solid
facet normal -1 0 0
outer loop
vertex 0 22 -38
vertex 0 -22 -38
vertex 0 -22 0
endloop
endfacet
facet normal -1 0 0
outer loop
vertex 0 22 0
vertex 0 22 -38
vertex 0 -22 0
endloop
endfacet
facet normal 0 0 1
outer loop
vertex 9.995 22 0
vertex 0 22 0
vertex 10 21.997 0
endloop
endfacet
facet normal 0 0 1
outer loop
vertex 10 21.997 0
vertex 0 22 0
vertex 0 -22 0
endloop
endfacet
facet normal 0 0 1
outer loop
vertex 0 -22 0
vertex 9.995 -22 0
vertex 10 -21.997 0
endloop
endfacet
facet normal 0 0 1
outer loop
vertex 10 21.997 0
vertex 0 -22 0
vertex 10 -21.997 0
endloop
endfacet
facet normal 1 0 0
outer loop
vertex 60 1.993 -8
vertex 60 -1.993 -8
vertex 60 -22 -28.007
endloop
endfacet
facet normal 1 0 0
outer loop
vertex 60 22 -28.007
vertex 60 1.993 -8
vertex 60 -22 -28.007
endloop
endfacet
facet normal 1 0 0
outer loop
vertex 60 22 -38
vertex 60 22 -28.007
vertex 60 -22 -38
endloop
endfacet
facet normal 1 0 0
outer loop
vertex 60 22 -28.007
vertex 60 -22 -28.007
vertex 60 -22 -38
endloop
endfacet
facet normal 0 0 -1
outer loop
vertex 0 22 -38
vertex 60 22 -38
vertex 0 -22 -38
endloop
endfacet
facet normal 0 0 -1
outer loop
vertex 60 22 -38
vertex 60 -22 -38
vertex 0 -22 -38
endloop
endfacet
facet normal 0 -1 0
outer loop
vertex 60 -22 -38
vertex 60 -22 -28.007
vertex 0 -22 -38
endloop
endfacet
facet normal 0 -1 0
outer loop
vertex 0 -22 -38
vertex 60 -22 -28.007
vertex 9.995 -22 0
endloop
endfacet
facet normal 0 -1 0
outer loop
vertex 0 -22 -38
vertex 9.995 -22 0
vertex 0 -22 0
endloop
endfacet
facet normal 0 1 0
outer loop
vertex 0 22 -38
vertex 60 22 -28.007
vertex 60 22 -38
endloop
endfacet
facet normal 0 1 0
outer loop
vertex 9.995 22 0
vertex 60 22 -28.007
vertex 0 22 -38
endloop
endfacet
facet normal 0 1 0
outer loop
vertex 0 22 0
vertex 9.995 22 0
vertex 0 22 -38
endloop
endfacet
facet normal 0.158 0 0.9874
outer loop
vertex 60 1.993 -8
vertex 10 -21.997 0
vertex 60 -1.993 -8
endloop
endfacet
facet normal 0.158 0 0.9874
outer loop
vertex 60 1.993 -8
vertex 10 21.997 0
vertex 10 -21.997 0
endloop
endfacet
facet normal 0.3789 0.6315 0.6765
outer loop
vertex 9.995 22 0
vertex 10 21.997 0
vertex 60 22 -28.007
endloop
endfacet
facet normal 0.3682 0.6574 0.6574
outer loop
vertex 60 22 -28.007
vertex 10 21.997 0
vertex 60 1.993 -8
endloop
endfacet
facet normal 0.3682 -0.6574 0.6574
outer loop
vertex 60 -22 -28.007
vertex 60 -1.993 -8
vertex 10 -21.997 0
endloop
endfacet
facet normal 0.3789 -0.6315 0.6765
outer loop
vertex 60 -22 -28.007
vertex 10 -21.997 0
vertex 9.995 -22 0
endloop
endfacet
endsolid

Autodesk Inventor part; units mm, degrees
ref_plane "YZ Plane" through (0, 0, 0) normal (1, 0, 0) x (0, 1, 0)
ref_plane "XZ Plane" through (0, 0, 0) normal (0, 1, 0) x (-1, 0, 0)
sketch "草圖1" plane through (0, 0, 0) normal (0, 1, 0) x (-1, 0, 0)
  line L0 (0, 0) -> (-60, 0)
  line L1 (-60, 0) -> (-60, -38)
  line L2 (-60, -38) -> (0, -38)
  line L3 (0, -38) -> (0, 0)
  dimension "d0" = 60
  dimension "d1" = 38
extrude "擠出1" add sketch "草圖1" along normal mid plane 44
sketch "草圖2" plane through (0, 22, 0) normal (0, 1, 0) x (1, 0, 0)
  line L0 (0, 0) -> (60, 0) projected
  line L1 (10, 0) -> (60, 8)
  line L2 (60, 0) -> (60, 38) projected
  dimension "d4" = 10
  dimension "d5" = 30
extrude "擠出2" cut sketch "草圖2" against normal blind 60
sketch "草圖3" plane through (60, -22, -38) normal (1, 0, 0) x (0, 0, -1)
  line L0 (-30, 24) -> (-10, 44)
  line L1 (0, 44) -> (-38, 44) projected
  line L2 (-30, 44) -> (-30, 0) projected
  point P0 (-38, 22)
  point P1 (-30, 2)
  dimension "d8" = 20
  dimension "d9" = 20
ref_plane "工作平面1" through (10, 22, 0) normal (-0.3682, -0.6574, -0.6574) x (0.8725, 0, -0.4886)
sketch "草圖4" plane through (10, 22, 0) normal (-0.3682, -0.6574, -0.6574) x (0.8725, 0, -0.4886)
  line L0 (-15.1543, -12.3218) -> (93.717, -12.3218)
  line L1 (93.717, -12.3218) -> (93.717, 28.8166)
  line L2 (93.717, 28.8166) -> (-15.1543, 28.8166)
  line L3 (-15.1543, 28.8166) -> (-15.1543, -12.3218)
  point P0 (-8.7251, 13.3649)
extrude "擠出3" cut sketch "草圖4" against normal blind 40
mirror "鏡射1" about plane through (0, 0, 0) normal (0, 1, 0) of "擠出3"
properties part number "53"
